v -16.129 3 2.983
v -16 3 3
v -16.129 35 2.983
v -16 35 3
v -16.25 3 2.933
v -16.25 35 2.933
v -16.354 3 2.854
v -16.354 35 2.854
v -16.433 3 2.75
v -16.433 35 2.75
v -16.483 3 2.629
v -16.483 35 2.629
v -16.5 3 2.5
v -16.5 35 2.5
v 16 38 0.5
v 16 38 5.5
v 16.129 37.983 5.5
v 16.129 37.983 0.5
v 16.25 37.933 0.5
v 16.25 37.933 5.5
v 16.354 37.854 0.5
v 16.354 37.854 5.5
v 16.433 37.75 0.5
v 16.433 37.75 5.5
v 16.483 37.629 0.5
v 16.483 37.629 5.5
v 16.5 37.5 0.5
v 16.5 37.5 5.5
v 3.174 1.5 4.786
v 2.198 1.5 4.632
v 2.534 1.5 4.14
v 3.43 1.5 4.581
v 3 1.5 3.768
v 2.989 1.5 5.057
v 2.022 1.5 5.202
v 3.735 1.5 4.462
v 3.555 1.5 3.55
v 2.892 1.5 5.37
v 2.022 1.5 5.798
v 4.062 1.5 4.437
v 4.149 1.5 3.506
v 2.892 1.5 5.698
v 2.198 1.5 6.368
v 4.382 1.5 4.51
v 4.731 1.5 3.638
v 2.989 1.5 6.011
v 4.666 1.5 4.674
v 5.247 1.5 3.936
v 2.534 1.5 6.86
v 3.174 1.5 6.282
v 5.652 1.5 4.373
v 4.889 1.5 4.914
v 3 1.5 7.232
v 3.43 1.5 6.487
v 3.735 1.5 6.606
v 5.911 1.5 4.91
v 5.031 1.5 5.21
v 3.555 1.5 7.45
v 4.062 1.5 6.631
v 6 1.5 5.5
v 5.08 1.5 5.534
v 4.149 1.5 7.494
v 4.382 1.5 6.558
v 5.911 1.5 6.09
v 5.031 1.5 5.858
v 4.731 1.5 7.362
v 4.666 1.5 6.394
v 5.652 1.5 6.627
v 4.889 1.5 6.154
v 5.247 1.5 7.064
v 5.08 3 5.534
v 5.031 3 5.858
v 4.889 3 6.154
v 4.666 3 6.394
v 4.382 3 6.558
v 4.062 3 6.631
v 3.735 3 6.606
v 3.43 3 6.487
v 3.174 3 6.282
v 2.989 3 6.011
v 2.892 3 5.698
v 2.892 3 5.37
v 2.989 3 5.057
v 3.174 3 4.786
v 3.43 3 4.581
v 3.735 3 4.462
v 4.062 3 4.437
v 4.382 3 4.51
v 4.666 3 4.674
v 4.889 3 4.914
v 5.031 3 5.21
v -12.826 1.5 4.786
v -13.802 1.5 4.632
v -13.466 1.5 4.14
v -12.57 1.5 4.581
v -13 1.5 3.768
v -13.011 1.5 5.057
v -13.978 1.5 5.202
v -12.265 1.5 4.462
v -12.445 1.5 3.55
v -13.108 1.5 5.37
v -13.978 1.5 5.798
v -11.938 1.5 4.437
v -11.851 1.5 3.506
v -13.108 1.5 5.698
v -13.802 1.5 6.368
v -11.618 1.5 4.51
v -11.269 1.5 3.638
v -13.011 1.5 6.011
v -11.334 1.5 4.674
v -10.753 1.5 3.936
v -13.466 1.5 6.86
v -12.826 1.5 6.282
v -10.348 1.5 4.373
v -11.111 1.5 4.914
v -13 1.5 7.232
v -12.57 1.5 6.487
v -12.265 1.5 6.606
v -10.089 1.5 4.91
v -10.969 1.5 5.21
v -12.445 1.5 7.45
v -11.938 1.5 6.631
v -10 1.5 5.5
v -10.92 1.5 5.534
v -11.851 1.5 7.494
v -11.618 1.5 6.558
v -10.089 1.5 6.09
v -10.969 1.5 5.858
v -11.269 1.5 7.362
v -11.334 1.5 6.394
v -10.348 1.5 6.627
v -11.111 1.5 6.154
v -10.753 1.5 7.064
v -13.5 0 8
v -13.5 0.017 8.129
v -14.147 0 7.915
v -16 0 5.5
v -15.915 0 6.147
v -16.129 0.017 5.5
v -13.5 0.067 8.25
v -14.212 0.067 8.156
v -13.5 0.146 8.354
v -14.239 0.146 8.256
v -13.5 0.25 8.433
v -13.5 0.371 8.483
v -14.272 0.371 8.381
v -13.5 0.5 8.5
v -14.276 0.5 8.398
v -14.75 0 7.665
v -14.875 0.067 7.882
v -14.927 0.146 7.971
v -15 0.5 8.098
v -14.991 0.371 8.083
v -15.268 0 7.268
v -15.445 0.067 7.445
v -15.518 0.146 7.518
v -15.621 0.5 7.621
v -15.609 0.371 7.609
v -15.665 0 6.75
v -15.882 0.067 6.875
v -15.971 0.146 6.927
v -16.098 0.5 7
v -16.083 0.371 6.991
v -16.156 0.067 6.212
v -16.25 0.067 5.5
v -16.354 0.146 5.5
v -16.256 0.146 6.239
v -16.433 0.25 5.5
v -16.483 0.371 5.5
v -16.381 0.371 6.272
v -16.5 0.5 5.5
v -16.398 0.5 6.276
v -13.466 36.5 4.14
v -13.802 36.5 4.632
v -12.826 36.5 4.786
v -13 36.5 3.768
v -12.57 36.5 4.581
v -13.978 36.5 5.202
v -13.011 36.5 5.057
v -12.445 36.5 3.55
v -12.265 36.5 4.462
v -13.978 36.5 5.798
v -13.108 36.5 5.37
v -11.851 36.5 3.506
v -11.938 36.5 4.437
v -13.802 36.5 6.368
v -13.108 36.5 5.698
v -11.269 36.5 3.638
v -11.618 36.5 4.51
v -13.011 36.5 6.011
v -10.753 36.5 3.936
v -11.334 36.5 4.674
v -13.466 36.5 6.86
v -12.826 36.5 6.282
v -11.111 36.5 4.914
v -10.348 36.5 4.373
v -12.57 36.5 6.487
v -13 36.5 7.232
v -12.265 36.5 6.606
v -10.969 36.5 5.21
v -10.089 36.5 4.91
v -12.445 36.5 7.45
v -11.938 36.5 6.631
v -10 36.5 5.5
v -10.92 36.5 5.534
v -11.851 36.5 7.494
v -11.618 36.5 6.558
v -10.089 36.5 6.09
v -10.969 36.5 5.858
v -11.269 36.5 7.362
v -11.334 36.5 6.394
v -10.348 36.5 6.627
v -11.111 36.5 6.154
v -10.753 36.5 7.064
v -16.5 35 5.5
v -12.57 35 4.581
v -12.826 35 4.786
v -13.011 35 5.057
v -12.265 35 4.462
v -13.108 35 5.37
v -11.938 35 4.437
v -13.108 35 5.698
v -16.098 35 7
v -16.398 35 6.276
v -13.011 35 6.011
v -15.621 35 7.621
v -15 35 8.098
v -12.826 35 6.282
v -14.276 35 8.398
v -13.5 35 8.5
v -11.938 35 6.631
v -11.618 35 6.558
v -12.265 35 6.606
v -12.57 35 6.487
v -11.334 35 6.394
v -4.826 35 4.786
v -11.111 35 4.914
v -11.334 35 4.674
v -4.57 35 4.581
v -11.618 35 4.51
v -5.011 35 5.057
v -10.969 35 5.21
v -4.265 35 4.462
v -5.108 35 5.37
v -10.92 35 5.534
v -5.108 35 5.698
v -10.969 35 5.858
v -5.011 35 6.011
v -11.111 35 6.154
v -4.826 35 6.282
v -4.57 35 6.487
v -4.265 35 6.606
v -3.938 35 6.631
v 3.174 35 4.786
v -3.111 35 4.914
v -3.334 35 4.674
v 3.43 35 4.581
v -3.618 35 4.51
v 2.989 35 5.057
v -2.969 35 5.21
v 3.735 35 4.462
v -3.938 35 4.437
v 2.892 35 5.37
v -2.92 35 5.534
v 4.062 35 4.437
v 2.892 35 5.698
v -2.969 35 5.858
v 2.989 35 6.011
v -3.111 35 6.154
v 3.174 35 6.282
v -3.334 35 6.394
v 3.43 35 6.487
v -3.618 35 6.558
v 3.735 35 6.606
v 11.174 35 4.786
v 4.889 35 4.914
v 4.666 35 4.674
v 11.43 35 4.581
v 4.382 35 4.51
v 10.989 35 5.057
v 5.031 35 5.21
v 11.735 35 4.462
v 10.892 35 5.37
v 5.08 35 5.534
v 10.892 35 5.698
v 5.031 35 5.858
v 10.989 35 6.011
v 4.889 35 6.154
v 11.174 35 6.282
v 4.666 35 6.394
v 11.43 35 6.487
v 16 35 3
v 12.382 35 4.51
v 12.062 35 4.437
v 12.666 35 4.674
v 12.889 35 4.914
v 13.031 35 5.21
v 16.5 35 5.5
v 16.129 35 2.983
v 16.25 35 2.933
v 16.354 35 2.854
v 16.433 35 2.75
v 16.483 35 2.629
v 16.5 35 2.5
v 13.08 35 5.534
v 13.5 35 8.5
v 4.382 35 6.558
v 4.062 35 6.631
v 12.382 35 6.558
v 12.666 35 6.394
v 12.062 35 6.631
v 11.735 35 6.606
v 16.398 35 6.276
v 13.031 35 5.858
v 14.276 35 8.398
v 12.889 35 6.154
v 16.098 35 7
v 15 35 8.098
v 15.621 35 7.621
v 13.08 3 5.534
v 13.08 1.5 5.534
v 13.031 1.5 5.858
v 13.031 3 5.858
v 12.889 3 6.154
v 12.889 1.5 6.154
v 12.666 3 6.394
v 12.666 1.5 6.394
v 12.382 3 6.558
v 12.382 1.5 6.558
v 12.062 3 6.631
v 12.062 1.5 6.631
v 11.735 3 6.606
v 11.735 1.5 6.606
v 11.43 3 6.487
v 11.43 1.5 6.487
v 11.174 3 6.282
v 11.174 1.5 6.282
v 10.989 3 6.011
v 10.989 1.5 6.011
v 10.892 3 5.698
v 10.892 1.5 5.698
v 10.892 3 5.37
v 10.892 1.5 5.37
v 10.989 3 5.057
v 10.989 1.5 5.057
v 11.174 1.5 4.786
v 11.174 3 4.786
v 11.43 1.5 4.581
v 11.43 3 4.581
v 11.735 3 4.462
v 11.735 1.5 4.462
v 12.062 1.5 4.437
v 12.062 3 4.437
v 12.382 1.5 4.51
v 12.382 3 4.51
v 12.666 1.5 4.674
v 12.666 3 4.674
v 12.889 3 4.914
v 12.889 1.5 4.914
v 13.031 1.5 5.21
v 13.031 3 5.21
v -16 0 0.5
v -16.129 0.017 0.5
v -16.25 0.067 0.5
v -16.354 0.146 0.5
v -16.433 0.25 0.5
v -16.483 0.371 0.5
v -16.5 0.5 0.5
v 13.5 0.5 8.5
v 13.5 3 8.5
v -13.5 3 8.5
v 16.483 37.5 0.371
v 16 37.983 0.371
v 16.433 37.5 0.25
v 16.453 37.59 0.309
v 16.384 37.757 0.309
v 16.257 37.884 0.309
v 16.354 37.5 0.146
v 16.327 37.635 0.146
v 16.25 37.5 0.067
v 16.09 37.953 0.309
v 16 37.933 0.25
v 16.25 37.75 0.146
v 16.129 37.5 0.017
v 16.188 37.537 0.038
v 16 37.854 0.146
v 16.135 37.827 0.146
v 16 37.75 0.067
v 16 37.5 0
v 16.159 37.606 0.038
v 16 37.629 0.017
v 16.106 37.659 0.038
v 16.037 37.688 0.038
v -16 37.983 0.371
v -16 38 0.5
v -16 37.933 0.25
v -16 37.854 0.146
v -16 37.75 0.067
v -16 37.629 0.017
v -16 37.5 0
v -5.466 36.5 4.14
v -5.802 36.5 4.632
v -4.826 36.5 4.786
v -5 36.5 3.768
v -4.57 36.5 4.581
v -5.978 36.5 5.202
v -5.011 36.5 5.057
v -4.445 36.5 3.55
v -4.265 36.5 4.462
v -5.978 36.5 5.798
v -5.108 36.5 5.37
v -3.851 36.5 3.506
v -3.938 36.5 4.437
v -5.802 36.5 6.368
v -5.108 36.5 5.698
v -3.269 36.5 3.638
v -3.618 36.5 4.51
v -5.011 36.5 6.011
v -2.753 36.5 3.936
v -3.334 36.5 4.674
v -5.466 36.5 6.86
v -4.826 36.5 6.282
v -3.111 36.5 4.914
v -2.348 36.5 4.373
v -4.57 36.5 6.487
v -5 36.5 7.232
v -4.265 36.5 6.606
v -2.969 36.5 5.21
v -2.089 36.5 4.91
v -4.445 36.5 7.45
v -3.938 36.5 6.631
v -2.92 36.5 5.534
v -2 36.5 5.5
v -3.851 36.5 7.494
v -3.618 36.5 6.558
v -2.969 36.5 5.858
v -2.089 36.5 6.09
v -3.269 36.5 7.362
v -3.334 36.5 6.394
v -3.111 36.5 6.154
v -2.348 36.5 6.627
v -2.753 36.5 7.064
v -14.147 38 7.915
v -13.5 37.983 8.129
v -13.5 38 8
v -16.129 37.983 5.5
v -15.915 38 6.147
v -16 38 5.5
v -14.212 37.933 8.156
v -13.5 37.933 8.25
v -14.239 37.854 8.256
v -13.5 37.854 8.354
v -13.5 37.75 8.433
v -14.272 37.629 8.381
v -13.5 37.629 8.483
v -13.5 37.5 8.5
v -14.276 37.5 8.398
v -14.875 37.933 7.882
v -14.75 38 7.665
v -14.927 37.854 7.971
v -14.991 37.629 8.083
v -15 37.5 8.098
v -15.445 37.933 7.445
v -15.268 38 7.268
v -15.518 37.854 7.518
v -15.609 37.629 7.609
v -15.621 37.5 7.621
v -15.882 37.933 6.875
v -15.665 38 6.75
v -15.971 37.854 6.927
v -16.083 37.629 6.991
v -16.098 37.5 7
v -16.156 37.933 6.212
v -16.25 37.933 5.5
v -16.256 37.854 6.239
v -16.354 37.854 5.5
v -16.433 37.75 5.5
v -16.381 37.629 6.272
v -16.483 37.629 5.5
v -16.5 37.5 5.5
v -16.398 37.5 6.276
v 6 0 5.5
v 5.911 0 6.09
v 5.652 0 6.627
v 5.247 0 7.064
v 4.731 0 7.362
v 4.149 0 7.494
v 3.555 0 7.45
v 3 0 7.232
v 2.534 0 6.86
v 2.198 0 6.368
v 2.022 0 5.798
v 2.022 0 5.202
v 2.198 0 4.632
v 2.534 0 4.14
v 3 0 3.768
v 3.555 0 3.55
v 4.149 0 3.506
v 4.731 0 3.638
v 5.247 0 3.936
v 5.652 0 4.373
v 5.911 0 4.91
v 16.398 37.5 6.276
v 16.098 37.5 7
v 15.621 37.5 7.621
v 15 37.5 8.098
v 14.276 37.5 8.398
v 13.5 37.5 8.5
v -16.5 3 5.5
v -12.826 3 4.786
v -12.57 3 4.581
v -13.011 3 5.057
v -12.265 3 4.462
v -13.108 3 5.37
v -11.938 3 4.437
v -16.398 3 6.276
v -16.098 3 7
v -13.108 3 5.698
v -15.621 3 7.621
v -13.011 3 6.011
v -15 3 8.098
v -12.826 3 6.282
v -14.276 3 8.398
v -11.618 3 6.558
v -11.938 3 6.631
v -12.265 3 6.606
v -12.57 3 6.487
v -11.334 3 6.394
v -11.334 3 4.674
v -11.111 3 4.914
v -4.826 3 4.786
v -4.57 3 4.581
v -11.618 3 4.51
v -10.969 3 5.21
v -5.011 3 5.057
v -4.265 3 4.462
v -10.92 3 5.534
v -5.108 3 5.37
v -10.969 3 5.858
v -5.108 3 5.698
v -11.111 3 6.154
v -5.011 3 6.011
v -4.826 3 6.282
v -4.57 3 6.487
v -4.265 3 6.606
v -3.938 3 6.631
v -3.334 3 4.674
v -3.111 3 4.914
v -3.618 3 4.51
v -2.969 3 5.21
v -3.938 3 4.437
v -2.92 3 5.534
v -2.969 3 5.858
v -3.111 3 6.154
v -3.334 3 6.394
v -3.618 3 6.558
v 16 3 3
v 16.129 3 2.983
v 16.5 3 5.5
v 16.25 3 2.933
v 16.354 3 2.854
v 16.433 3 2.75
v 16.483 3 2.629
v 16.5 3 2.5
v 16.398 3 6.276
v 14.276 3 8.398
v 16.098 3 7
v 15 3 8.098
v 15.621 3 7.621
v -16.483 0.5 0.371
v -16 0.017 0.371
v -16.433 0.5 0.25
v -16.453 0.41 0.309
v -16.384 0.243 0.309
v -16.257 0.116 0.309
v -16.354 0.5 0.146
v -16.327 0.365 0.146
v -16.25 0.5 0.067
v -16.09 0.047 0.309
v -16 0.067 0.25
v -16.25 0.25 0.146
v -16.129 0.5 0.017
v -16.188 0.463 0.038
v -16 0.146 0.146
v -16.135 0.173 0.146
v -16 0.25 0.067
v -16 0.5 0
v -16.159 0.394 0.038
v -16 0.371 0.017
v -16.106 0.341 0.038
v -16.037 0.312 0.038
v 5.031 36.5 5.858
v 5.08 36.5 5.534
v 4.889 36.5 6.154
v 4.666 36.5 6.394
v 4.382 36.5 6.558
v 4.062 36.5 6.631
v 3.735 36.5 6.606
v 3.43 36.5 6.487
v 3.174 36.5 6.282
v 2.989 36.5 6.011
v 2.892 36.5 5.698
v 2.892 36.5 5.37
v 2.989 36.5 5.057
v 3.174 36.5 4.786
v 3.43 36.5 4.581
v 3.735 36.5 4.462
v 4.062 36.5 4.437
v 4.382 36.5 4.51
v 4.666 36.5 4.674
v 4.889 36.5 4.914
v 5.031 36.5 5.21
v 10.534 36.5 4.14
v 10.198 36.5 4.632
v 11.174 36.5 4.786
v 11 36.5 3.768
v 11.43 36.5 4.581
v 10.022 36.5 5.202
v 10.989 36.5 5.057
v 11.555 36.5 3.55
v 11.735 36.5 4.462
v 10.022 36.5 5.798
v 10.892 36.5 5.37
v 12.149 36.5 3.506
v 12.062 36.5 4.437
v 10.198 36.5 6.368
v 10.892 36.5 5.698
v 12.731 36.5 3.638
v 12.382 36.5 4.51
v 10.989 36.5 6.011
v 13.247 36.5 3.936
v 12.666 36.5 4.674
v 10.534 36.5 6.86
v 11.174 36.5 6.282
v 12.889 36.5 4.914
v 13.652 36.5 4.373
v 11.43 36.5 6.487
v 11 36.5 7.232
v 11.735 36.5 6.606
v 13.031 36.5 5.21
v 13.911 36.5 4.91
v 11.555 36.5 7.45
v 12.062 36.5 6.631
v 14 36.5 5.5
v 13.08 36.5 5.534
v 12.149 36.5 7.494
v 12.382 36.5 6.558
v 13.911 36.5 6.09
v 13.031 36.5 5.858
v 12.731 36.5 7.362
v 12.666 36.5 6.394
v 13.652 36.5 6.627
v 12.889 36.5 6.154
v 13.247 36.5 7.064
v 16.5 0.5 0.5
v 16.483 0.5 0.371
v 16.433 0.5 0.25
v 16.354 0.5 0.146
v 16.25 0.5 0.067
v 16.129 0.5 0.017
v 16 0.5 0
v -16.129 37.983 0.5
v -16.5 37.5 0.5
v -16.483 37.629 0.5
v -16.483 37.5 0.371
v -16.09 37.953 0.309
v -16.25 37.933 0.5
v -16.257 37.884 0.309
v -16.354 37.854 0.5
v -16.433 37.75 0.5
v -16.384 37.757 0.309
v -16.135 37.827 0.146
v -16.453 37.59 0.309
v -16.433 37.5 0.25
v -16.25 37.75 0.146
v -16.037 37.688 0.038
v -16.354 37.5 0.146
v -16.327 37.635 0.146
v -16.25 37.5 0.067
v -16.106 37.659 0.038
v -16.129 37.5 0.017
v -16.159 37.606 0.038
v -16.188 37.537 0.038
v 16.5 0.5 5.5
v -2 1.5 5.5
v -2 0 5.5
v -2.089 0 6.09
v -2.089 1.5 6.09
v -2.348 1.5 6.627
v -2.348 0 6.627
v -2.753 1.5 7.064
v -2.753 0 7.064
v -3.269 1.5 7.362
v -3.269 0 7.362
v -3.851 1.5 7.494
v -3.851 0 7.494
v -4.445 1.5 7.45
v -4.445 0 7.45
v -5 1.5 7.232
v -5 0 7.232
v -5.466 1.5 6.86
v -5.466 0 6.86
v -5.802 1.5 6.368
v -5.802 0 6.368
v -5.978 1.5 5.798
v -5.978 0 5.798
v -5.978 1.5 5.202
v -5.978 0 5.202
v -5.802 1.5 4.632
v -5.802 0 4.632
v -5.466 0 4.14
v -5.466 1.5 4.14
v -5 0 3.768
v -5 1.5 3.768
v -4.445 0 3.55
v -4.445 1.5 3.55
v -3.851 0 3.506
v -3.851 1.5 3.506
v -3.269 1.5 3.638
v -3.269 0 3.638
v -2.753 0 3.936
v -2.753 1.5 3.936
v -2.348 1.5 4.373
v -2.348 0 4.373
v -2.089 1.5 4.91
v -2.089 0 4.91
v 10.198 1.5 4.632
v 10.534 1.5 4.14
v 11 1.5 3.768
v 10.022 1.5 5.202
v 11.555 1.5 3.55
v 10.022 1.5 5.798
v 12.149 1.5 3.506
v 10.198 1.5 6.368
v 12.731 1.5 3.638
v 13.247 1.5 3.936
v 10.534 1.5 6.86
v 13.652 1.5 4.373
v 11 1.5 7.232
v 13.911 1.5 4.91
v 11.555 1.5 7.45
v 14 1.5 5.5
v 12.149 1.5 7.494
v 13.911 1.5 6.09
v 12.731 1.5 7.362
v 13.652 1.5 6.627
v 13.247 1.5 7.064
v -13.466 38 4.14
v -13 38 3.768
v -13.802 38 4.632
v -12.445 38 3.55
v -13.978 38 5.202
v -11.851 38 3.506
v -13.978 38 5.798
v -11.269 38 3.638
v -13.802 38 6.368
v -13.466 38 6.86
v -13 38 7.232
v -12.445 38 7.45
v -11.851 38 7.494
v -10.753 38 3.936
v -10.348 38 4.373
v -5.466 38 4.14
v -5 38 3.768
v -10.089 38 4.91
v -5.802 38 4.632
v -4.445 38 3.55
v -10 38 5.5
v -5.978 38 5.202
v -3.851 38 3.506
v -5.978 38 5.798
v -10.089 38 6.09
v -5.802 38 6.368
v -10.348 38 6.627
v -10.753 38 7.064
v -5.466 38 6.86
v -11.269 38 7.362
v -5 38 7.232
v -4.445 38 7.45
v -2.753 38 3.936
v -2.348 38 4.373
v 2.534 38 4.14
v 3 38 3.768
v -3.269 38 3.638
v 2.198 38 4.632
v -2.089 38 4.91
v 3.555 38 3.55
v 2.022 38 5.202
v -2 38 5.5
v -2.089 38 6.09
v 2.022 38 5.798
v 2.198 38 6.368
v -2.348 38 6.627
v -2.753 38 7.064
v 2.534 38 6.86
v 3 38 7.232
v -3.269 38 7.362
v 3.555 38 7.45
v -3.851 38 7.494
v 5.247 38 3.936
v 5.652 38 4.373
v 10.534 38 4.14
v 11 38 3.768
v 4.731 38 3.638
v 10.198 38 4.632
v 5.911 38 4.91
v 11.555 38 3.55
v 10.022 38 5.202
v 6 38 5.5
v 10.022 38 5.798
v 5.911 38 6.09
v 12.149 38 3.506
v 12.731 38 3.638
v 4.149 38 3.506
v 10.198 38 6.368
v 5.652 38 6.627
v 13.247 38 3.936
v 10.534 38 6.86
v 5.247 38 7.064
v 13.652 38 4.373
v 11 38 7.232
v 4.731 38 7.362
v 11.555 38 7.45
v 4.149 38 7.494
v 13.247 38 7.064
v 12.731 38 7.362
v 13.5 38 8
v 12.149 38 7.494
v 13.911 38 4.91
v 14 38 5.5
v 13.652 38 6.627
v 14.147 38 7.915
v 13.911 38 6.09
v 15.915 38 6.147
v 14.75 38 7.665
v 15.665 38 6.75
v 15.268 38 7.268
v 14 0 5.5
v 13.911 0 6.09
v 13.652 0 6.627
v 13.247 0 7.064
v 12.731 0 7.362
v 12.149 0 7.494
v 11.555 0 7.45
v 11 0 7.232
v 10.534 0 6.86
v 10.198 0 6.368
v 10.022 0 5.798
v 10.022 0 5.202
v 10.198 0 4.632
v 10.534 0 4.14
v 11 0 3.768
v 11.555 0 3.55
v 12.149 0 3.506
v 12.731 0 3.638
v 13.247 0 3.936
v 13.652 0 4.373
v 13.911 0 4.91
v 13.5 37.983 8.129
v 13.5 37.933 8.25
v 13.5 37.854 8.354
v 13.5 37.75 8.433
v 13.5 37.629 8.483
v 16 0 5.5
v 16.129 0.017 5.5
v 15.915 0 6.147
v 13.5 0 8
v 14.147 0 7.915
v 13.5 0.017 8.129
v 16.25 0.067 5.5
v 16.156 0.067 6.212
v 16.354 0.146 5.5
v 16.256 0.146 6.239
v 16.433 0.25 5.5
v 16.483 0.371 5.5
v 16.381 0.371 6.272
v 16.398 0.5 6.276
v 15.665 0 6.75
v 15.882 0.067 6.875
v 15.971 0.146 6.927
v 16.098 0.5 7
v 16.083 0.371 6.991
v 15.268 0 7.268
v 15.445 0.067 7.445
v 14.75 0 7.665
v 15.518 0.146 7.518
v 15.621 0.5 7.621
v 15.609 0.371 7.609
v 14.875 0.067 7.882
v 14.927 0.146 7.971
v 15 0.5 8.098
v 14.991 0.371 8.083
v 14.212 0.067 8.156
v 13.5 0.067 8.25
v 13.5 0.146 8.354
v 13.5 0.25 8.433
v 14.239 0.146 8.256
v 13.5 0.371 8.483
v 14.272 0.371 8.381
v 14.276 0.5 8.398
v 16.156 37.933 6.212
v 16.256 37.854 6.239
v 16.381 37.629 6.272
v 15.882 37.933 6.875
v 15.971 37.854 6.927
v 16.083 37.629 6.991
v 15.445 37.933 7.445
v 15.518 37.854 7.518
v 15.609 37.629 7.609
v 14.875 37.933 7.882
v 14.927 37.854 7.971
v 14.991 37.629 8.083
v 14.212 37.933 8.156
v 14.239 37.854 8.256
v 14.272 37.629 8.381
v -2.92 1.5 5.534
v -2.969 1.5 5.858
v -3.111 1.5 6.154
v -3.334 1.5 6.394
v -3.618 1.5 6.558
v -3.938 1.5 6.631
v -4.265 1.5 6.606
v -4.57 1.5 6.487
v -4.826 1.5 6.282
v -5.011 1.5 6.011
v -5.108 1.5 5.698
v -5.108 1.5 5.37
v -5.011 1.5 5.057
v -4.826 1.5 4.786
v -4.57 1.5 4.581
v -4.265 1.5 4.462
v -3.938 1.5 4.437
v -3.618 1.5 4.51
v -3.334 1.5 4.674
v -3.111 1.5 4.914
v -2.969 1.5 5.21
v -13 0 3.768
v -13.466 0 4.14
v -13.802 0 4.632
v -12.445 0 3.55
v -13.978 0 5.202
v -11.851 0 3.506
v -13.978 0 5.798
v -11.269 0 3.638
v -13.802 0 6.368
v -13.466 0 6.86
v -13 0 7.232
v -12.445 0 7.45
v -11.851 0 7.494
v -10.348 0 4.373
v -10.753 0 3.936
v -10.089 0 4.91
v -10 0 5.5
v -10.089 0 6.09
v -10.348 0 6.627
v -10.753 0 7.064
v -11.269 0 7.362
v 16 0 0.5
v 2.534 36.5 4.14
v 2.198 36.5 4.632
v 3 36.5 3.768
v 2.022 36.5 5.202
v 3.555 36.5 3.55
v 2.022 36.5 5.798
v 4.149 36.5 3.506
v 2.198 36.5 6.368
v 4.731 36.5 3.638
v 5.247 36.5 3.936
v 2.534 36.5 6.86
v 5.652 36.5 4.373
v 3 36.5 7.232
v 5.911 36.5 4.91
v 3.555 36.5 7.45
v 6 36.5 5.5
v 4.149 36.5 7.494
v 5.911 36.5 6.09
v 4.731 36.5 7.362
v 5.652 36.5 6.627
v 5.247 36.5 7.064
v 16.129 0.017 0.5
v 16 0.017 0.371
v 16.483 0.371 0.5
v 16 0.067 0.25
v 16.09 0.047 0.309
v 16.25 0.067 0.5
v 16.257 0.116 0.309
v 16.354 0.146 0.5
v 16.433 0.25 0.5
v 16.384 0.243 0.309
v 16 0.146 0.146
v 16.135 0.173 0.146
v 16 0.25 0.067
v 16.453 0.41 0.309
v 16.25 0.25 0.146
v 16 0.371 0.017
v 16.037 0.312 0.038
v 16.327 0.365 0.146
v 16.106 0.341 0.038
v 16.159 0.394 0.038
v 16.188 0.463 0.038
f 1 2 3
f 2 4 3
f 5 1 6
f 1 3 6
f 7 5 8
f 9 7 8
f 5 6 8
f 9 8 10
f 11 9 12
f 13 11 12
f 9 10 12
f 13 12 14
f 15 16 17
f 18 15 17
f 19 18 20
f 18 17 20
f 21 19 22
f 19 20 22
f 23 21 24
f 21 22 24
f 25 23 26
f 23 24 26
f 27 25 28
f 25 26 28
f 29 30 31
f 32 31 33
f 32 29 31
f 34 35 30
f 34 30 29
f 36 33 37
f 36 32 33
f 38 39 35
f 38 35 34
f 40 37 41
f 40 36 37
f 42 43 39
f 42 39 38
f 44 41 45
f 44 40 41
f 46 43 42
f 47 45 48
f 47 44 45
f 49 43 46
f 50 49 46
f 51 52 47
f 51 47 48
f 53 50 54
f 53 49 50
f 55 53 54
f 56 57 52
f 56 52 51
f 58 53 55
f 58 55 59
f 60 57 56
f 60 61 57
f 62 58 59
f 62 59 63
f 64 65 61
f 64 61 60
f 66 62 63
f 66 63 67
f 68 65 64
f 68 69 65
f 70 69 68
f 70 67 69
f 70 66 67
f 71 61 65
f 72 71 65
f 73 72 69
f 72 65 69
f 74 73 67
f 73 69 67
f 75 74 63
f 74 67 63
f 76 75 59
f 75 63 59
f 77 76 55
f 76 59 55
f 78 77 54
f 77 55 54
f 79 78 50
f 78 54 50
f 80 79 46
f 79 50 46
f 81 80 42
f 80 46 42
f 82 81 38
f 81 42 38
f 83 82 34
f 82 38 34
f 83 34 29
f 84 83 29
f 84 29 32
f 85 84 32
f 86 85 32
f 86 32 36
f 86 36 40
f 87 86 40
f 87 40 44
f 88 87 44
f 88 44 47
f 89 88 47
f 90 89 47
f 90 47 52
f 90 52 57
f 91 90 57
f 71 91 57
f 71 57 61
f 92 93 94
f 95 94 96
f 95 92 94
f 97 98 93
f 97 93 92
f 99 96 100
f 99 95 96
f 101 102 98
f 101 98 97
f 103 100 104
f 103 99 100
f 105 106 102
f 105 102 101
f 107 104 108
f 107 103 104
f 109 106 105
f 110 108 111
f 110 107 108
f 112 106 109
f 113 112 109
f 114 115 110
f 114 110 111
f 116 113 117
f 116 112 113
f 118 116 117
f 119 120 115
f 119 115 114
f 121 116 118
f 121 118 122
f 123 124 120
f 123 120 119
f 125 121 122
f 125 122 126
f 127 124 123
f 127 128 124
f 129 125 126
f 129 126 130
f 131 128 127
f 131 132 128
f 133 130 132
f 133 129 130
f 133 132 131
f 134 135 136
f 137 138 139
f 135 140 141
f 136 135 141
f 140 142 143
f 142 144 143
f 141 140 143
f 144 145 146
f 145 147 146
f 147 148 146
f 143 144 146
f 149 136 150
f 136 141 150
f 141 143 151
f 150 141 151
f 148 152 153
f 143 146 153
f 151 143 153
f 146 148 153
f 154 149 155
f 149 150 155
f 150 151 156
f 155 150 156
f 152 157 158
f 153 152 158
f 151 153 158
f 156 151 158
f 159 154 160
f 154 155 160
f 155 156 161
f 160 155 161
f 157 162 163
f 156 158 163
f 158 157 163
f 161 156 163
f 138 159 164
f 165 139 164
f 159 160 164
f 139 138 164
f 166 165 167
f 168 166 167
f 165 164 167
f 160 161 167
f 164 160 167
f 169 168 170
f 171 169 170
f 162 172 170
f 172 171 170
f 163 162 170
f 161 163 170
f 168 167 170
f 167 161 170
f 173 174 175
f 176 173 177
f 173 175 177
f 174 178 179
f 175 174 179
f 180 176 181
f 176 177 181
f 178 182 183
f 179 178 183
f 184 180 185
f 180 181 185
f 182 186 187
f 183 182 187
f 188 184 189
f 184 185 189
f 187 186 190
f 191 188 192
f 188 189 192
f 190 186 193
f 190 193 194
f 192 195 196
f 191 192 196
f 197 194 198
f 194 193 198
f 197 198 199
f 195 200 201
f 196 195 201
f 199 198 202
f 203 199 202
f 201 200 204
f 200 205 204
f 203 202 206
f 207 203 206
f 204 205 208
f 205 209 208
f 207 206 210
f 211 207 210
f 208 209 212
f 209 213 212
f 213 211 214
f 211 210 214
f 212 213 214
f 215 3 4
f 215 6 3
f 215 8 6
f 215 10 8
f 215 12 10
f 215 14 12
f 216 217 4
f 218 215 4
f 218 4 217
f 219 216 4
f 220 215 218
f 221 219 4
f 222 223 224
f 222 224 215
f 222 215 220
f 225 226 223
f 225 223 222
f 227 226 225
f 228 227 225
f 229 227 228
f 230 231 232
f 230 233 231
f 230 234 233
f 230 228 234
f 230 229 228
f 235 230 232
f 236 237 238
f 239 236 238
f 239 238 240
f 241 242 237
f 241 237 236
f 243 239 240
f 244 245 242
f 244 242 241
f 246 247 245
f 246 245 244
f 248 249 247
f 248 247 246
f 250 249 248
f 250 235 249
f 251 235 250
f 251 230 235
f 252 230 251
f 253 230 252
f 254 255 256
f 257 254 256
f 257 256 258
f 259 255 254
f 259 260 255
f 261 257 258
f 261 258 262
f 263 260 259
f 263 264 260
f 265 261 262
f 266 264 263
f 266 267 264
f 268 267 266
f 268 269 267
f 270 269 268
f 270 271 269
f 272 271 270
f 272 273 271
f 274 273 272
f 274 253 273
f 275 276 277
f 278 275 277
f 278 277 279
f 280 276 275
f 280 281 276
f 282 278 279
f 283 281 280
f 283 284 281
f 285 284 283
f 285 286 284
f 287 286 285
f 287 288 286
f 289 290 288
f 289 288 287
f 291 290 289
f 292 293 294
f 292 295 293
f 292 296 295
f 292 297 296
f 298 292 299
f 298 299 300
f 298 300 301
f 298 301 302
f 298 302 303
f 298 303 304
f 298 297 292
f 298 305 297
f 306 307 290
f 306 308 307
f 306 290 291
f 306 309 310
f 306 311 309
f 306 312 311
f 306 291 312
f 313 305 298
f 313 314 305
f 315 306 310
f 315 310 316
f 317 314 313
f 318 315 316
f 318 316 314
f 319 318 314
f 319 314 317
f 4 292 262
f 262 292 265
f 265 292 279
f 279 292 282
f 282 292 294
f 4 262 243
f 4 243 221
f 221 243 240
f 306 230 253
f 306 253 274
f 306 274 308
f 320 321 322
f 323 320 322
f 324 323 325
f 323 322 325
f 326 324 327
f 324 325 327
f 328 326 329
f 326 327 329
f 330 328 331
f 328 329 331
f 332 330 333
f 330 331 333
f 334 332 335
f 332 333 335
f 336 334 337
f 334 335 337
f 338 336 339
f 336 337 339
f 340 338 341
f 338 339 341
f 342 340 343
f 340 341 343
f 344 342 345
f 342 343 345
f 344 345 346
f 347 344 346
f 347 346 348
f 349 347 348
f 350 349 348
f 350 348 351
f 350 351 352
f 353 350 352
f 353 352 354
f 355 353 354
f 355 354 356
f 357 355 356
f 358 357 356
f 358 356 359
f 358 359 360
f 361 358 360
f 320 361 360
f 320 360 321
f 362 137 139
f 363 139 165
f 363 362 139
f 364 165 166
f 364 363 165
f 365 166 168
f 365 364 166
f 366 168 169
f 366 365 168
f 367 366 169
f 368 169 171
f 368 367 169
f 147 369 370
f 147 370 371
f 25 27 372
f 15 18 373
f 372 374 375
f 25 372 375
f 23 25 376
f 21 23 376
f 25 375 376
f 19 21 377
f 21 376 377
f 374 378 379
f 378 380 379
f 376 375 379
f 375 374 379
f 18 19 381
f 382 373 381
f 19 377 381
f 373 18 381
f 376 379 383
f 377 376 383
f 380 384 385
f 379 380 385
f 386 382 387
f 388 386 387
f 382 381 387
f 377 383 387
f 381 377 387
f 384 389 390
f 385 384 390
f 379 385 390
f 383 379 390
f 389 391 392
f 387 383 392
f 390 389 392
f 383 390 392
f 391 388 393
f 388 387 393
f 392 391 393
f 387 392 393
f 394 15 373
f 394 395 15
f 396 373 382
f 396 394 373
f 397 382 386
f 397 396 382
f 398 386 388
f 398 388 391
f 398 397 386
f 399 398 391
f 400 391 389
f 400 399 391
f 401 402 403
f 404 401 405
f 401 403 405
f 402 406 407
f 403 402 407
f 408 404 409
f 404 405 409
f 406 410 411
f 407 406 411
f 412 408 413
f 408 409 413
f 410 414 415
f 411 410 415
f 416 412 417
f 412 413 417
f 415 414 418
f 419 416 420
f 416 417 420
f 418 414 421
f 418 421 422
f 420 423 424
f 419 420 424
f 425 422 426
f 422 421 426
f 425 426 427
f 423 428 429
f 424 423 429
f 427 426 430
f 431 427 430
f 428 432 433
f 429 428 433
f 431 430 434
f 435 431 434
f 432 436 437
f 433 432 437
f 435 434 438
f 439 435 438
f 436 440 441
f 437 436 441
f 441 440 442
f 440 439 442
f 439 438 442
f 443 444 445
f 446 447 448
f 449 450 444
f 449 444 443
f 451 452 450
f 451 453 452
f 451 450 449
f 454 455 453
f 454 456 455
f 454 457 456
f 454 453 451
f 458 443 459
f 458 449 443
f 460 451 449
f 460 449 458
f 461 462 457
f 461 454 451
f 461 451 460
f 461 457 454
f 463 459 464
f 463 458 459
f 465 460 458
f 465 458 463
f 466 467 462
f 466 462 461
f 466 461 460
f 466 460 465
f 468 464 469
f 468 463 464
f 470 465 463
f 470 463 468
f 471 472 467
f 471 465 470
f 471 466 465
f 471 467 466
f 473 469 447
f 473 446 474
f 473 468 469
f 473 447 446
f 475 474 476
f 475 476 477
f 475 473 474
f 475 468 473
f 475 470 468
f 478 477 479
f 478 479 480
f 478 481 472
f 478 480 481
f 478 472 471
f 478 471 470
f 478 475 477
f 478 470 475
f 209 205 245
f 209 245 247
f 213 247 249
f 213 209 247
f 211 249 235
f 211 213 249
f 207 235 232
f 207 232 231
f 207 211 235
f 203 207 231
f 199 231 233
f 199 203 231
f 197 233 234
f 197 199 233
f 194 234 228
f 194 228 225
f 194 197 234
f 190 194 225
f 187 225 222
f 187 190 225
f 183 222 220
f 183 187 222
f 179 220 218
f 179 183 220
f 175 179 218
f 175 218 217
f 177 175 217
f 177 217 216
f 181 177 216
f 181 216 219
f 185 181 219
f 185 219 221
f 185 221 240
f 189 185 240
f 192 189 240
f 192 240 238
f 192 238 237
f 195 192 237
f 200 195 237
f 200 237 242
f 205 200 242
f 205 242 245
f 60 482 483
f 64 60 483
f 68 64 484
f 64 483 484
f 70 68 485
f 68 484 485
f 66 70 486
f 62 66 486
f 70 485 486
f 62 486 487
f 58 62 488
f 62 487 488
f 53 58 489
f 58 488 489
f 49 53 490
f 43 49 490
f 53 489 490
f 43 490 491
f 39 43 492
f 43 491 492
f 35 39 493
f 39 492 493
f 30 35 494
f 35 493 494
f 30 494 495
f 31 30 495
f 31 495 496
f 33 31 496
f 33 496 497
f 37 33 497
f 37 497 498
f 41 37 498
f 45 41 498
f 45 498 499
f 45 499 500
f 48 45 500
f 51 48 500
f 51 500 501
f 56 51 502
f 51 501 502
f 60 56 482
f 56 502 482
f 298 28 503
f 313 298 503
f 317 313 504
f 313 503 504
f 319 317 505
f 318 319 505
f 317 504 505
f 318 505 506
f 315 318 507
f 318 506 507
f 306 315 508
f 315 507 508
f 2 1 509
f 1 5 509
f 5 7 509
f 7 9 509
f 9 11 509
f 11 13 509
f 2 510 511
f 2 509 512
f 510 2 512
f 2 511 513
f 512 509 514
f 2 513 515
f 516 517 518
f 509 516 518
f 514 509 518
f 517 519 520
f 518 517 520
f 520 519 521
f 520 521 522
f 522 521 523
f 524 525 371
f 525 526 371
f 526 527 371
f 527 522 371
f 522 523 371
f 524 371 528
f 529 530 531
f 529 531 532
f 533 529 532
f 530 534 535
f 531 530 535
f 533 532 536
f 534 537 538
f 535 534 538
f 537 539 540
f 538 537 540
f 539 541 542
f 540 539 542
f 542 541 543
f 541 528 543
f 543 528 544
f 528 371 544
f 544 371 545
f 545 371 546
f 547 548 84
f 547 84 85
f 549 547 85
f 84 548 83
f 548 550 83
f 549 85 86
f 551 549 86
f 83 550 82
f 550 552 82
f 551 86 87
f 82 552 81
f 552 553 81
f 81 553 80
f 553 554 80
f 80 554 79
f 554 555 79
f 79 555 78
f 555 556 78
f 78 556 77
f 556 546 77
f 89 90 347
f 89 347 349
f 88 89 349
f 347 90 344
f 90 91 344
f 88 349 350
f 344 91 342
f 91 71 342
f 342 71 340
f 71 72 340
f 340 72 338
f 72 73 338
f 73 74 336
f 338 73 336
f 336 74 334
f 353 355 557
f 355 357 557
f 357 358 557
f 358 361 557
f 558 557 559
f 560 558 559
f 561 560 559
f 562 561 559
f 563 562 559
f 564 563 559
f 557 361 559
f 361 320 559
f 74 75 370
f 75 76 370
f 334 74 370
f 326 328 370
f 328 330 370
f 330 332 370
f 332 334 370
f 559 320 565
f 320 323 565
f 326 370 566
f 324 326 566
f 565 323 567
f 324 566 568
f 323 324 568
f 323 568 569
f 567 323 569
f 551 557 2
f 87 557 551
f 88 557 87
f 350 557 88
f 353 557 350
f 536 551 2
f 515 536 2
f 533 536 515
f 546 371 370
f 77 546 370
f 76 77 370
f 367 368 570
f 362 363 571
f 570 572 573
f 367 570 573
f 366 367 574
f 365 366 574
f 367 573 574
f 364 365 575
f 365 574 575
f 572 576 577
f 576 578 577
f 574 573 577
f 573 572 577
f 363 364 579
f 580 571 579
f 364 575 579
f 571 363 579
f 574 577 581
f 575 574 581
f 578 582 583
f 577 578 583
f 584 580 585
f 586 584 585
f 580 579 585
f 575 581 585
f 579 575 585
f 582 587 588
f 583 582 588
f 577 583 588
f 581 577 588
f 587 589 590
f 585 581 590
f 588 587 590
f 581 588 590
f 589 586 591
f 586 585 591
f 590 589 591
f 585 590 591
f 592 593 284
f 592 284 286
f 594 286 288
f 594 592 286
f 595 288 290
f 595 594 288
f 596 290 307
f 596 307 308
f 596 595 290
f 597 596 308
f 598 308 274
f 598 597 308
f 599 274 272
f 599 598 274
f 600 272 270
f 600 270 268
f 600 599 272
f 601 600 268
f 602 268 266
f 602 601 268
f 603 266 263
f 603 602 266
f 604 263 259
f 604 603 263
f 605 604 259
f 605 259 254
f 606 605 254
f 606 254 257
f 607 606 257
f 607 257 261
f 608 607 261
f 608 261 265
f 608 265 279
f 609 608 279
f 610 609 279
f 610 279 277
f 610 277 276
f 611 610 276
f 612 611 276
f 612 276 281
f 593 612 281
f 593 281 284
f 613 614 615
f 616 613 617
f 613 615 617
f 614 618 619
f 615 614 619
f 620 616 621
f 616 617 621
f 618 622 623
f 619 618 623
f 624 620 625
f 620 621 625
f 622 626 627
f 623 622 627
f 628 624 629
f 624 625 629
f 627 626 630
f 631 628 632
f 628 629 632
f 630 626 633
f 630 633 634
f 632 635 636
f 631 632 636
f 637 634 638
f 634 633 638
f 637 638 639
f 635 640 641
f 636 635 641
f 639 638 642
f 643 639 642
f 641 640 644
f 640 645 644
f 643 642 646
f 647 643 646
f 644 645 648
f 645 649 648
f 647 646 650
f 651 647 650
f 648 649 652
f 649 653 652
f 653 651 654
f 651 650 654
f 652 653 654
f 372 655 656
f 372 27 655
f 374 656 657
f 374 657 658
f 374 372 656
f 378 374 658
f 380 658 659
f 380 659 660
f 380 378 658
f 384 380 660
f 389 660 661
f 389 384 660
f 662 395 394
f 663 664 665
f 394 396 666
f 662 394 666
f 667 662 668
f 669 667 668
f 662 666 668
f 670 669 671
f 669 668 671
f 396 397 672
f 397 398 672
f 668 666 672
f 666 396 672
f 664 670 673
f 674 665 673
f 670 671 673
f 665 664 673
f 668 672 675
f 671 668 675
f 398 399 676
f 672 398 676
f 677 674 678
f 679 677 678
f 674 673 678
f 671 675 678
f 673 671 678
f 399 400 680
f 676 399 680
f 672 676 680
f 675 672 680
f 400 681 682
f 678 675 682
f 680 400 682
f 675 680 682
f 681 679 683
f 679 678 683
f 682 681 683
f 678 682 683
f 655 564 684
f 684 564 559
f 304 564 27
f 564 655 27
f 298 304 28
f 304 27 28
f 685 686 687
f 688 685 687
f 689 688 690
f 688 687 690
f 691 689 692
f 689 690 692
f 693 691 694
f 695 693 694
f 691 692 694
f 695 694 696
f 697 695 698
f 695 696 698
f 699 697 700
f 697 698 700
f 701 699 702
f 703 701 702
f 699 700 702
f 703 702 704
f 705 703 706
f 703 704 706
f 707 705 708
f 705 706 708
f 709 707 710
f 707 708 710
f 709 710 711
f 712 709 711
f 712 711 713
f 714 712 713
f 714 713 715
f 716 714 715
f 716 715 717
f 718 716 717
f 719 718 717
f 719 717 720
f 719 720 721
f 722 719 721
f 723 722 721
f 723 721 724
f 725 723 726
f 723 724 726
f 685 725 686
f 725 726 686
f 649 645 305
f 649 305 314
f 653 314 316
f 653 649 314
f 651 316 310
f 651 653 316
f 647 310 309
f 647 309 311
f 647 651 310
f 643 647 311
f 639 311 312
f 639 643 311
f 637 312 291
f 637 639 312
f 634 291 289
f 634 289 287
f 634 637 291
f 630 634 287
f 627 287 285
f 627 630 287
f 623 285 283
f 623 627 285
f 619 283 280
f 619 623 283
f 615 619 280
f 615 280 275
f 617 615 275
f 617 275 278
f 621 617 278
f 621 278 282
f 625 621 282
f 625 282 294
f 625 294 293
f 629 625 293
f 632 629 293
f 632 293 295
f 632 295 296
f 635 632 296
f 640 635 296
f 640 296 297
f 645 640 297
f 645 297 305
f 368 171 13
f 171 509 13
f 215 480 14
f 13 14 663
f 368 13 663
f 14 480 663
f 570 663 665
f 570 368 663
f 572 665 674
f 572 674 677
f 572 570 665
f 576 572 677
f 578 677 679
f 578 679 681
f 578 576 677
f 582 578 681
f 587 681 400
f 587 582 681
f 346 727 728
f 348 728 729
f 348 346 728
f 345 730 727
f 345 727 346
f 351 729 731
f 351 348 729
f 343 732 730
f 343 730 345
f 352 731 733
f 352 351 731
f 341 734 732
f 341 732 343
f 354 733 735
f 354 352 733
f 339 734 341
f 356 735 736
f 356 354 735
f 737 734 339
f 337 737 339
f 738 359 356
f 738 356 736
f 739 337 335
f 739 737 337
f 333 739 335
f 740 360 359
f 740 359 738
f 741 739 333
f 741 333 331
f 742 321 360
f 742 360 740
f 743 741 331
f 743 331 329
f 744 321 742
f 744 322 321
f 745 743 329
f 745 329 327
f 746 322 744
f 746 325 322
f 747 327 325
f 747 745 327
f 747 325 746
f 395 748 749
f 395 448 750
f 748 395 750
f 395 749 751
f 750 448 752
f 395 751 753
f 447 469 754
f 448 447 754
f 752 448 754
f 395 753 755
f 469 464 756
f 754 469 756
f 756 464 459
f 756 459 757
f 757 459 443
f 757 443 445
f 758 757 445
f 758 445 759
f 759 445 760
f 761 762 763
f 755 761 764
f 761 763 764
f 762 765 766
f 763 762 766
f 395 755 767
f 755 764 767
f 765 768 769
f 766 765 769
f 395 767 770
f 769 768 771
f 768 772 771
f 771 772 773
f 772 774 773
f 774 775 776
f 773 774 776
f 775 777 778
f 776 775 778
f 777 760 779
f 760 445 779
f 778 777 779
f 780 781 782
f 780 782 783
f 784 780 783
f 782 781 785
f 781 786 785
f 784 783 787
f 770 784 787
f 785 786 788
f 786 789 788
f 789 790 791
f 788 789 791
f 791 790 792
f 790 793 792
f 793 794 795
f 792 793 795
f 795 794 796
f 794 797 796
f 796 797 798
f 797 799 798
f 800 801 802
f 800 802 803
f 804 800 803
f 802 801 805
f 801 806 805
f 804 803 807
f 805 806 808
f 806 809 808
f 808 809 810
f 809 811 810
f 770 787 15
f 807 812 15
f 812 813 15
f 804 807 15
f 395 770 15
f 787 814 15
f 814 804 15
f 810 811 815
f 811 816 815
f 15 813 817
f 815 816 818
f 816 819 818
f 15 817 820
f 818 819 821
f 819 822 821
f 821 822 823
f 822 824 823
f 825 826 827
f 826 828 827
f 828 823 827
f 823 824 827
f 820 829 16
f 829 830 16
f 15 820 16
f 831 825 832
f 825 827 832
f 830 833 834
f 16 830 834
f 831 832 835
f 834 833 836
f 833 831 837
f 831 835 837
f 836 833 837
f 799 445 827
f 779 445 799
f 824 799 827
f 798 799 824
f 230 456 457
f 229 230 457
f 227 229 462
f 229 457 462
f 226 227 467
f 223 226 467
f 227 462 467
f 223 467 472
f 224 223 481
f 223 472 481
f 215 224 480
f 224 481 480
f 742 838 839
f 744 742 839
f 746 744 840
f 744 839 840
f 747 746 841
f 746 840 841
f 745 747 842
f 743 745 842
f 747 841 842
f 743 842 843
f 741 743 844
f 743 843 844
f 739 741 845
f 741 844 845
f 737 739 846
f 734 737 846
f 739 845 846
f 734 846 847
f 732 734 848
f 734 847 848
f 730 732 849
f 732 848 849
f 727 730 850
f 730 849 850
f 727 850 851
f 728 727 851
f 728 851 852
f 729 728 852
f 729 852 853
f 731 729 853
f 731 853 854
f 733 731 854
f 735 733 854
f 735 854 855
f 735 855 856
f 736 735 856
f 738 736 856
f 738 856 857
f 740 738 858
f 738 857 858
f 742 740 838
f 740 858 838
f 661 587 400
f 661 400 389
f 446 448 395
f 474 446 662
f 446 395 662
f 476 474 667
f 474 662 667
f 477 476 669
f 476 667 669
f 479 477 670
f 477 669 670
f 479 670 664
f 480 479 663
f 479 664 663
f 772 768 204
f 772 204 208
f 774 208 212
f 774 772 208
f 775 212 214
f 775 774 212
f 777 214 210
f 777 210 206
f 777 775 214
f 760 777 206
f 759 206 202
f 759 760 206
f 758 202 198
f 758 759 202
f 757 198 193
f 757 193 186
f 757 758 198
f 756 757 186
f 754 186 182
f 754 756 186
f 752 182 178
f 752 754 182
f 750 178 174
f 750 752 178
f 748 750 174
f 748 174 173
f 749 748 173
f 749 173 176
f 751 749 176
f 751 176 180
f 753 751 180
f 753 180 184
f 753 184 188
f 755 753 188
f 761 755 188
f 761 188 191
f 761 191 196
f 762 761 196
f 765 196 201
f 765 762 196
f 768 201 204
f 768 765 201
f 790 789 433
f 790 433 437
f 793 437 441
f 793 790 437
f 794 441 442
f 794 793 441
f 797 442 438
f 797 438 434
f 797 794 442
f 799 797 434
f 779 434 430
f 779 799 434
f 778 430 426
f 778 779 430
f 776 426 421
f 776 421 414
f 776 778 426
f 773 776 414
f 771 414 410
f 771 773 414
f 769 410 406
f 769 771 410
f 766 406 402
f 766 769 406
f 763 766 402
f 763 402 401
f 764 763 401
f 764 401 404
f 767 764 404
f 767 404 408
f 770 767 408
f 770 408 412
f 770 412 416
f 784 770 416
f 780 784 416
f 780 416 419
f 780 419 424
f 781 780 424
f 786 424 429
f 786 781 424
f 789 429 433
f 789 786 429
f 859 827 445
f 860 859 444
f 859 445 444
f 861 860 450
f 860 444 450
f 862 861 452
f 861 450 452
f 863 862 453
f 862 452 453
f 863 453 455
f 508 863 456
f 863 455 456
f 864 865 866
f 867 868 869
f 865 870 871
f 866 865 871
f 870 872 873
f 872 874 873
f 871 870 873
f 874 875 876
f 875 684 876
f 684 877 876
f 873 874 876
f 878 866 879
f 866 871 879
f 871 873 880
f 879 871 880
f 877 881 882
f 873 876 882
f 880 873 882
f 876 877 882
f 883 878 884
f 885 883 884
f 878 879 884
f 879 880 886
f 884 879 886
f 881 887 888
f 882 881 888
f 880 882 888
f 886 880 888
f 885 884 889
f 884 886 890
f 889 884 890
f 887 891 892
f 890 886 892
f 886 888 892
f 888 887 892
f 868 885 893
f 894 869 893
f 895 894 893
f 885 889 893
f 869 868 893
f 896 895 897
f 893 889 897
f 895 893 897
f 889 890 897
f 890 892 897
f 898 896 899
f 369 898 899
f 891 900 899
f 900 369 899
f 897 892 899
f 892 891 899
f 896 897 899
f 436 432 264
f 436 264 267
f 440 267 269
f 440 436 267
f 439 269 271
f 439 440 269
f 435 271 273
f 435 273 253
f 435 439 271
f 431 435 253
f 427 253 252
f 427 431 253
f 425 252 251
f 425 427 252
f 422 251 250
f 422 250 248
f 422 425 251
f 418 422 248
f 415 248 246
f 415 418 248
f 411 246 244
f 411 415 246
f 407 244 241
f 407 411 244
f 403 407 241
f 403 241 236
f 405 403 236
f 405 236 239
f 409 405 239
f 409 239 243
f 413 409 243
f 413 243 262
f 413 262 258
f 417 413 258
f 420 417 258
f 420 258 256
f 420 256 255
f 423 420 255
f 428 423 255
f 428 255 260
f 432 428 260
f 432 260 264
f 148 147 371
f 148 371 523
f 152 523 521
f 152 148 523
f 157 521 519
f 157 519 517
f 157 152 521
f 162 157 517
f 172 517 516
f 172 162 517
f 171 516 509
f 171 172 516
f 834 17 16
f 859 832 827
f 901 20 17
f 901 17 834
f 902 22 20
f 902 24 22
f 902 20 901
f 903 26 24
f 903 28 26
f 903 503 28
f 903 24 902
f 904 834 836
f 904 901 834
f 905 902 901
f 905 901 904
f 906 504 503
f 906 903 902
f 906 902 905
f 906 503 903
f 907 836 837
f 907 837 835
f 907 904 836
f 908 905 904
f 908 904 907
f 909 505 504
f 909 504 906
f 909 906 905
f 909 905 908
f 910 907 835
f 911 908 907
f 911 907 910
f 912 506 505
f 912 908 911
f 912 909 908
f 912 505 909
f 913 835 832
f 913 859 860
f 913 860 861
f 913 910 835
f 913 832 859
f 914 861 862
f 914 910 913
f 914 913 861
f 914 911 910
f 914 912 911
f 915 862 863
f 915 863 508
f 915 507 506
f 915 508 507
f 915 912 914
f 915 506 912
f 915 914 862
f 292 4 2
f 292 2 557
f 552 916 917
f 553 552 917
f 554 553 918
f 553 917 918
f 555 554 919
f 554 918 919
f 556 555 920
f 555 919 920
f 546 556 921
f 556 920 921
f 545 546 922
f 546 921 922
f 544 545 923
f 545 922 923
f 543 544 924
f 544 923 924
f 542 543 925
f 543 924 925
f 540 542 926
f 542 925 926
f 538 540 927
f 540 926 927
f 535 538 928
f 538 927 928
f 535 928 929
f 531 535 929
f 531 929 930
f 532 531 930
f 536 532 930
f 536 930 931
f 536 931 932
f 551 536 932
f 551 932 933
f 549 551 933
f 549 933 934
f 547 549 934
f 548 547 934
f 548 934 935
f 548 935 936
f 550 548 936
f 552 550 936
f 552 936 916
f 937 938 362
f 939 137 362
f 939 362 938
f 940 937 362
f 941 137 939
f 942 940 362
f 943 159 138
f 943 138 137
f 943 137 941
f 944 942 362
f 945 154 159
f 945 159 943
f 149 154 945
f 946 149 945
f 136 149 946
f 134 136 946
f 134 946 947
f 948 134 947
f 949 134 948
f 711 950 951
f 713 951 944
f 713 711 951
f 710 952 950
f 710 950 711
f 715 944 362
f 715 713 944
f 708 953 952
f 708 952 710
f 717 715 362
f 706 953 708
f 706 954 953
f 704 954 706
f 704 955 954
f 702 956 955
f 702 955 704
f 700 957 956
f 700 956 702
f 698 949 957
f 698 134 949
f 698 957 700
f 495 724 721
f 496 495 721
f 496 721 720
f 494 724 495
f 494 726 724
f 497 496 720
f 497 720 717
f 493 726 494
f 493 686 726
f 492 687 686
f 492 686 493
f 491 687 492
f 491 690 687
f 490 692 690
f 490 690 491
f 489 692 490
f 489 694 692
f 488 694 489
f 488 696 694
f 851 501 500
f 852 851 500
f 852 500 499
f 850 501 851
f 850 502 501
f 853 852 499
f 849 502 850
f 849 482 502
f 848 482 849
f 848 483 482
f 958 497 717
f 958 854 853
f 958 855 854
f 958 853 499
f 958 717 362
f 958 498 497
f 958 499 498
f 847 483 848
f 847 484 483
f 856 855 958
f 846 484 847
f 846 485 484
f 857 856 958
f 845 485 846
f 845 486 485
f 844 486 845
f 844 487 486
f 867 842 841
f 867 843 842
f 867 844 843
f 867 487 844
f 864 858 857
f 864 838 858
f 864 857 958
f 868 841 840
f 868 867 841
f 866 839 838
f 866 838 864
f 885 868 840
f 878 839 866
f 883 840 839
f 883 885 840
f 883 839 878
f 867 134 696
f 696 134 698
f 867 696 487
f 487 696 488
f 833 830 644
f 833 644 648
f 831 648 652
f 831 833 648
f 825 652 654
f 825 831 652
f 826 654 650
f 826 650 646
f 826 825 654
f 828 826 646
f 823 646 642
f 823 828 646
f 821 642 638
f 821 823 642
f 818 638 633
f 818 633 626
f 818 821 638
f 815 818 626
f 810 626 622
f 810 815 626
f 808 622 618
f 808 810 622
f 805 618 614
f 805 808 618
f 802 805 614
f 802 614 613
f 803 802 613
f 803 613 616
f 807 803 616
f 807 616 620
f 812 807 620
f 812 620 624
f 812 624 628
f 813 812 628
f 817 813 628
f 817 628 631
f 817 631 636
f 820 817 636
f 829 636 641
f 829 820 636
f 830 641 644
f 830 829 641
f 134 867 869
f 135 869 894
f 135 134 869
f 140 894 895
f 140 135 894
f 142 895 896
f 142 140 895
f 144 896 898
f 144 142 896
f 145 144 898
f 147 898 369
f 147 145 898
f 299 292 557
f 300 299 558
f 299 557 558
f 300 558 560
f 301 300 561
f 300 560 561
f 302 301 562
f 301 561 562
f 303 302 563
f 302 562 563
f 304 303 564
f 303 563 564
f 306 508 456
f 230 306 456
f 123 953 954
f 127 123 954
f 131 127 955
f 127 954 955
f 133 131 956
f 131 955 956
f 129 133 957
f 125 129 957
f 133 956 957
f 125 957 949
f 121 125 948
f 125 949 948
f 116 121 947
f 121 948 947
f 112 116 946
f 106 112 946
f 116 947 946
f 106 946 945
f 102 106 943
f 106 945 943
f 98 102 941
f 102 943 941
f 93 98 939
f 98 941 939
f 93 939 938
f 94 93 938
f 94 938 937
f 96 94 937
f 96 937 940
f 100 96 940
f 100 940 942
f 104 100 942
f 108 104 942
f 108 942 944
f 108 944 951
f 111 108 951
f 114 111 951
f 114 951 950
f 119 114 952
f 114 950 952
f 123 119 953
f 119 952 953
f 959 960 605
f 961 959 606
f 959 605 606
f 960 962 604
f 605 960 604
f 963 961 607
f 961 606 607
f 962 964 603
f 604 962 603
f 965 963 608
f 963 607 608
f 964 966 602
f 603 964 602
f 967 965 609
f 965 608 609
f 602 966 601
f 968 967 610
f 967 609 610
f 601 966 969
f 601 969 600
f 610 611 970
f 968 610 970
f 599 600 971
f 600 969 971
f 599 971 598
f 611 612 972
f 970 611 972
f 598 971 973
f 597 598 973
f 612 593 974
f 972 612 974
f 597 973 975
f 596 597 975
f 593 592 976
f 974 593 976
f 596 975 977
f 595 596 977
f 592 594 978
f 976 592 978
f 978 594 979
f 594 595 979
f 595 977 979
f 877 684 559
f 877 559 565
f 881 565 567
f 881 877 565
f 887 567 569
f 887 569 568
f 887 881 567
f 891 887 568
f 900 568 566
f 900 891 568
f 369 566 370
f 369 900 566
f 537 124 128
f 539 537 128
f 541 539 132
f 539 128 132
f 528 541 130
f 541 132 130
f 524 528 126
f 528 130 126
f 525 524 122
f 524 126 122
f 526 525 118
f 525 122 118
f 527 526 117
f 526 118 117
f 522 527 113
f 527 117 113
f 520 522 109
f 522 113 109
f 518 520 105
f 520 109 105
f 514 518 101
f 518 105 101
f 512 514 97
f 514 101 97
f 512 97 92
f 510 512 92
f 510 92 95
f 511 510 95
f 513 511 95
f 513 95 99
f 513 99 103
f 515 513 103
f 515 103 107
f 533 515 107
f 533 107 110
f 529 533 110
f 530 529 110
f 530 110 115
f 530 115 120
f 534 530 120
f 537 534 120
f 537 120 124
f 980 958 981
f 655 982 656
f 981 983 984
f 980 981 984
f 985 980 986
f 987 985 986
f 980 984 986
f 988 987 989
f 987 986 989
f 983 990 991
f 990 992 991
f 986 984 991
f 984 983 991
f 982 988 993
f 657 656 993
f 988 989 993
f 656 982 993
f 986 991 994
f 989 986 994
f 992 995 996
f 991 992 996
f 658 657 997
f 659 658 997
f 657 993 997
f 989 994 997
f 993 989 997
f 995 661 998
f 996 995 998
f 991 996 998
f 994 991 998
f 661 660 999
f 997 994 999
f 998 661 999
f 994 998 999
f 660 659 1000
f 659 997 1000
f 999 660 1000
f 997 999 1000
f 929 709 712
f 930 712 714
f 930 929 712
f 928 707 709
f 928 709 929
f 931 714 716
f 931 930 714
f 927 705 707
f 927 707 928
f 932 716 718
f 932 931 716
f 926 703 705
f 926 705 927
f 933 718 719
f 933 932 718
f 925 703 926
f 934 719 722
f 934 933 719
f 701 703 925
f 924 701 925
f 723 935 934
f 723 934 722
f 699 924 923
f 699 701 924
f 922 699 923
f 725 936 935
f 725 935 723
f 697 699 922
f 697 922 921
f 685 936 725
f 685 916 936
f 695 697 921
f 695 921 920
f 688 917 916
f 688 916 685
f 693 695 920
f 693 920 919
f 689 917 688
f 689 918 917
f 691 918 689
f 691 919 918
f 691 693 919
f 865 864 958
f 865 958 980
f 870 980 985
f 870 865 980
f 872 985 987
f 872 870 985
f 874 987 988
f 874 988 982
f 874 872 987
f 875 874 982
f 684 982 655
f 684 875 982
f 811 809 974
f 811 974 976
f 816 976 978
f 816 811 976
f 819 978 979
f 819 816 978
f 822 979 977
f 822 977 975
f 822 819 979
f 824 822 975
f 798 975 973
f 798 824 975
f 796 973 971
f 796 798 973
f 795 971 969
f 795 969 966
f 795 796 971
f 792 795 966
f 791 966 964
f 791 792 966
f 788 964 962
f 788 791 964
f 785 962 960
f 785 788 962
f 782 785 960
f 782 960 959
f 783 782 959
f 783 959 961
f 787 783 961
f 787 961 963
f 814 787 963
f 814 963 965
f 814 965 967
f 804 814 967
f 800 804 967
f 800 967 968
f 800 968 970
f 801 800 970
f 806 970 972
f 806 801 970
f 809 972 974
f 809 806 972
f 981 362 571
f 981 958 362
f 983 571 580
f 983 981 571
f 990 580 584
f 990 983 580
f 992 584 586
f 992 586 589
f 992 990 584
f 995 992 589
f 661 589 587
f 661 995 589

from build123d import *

# Parameters (mm, degrees)
F4_DEPTH = 3
F1_R     = 2
F5_DEPTH = 1.5
F2_R     = 1.1
F6_DEPTH = 3
F3_W     = 33
F3_H     = 3
F7_DEPTH = 19
F9_R     = 0.5
F10_R    = 0.5


with BuildPart() as f4:
    # F0 (on Front) → F4 (new body)
    with BuildSketch(Plane.XZ):
        with BuildLine():
            Line((13.5, 8.5), (-13.5, 8.5))
            ThreePointArc((-13.5, 8.5), (-15.6213203436, 7.6213203436), (-16.5, 5.5))
            Line((-16.5, 5.5), (-16.5, 0))
            Line((-16.5, 0), (16.5, 0))
            Line((16.5, 0), (16.5, 5.5))
            ThreePointArc((16.5, 5.5), (15.6213203436, 7.6213203436), (13.5, 8.5))
        make_face()
    extrude(amount=-F4_DEPTH)

    # F1 (on Front) → F5 (cut)
    with BuildSketch(Plane.XZ):
        with Locations((-12, 5.5)):
            Circle(F1_R)
        with Locations((-4, 5.5)):
            Circle(F1_R)
        with Locations((4, 5.5)):
            Circle(F1_R)
        with Locations((12, 5.5)):
            Circle(F1_R)
    extrude(amount=-F5_DEPTH, mode=Mode.SUBTRACT)

    # F2 (on Front) → F6 (cut)
    with BuildSketch(Plane.XZ):
        with Locations((-12.0200179517, 5.5340062827)):
            Circle(F2_R)
        with Locations((-4.0200179517, 5.5340062827)):
            Circle(F2_R)
        with Locations((3.9799820483, 5.5340062827)):
            Circle(F2_R)
        with Locations((11.9799820483, 5.5340062827)):
            Circle(F2_R)
    extrude(amount=-F6_DEPTH, mode=Mode.SUBTRACT)

    # F3 (on Front) → F7 (join)
    with BuildSketch(Plane.XZ):
        with Locations((0, 1.5)):
            Rectangle(F3_W, F3_H)
    extrude(amount=-F7_DEPTH)

    # F8: F4 across face


with BuildPart() as f4_1:
    add(f4.part)
    add(f4.part.mirror(Plane(origin=(0, 19, 1.5), x_dir=(1, 0, 0), z_dir=(0, 1, 0))))

    # F9
    f9_edges = [f4_1.edges().sort_by_distance(p)[0] for p in [
        (0, 0, 8.5),
        (0, 38, 8.5),
        (16.5, 19, 3),
        (-16.5, 19, 3),
    ]]
    fillet(f9_edges, radius=F9_R)

    # F10
    f10_edges = [f4_1.edges().sort_by_distance(p)[0] for p in [
        (-16.5, 19, 0),
        (-16.353553, 37.853553, 0),
        (-16.353553, 0.146447, 0),
        (0, 38, 0),
        (0, 0, 0),
        (16.353553, 37.853553, 0),
        (16.353553, 0.146447, 0),
        (16.5, 19, 0),
    ]]
    fillet(f10_edges, radius=F10_R)


solid = f4_1.part
